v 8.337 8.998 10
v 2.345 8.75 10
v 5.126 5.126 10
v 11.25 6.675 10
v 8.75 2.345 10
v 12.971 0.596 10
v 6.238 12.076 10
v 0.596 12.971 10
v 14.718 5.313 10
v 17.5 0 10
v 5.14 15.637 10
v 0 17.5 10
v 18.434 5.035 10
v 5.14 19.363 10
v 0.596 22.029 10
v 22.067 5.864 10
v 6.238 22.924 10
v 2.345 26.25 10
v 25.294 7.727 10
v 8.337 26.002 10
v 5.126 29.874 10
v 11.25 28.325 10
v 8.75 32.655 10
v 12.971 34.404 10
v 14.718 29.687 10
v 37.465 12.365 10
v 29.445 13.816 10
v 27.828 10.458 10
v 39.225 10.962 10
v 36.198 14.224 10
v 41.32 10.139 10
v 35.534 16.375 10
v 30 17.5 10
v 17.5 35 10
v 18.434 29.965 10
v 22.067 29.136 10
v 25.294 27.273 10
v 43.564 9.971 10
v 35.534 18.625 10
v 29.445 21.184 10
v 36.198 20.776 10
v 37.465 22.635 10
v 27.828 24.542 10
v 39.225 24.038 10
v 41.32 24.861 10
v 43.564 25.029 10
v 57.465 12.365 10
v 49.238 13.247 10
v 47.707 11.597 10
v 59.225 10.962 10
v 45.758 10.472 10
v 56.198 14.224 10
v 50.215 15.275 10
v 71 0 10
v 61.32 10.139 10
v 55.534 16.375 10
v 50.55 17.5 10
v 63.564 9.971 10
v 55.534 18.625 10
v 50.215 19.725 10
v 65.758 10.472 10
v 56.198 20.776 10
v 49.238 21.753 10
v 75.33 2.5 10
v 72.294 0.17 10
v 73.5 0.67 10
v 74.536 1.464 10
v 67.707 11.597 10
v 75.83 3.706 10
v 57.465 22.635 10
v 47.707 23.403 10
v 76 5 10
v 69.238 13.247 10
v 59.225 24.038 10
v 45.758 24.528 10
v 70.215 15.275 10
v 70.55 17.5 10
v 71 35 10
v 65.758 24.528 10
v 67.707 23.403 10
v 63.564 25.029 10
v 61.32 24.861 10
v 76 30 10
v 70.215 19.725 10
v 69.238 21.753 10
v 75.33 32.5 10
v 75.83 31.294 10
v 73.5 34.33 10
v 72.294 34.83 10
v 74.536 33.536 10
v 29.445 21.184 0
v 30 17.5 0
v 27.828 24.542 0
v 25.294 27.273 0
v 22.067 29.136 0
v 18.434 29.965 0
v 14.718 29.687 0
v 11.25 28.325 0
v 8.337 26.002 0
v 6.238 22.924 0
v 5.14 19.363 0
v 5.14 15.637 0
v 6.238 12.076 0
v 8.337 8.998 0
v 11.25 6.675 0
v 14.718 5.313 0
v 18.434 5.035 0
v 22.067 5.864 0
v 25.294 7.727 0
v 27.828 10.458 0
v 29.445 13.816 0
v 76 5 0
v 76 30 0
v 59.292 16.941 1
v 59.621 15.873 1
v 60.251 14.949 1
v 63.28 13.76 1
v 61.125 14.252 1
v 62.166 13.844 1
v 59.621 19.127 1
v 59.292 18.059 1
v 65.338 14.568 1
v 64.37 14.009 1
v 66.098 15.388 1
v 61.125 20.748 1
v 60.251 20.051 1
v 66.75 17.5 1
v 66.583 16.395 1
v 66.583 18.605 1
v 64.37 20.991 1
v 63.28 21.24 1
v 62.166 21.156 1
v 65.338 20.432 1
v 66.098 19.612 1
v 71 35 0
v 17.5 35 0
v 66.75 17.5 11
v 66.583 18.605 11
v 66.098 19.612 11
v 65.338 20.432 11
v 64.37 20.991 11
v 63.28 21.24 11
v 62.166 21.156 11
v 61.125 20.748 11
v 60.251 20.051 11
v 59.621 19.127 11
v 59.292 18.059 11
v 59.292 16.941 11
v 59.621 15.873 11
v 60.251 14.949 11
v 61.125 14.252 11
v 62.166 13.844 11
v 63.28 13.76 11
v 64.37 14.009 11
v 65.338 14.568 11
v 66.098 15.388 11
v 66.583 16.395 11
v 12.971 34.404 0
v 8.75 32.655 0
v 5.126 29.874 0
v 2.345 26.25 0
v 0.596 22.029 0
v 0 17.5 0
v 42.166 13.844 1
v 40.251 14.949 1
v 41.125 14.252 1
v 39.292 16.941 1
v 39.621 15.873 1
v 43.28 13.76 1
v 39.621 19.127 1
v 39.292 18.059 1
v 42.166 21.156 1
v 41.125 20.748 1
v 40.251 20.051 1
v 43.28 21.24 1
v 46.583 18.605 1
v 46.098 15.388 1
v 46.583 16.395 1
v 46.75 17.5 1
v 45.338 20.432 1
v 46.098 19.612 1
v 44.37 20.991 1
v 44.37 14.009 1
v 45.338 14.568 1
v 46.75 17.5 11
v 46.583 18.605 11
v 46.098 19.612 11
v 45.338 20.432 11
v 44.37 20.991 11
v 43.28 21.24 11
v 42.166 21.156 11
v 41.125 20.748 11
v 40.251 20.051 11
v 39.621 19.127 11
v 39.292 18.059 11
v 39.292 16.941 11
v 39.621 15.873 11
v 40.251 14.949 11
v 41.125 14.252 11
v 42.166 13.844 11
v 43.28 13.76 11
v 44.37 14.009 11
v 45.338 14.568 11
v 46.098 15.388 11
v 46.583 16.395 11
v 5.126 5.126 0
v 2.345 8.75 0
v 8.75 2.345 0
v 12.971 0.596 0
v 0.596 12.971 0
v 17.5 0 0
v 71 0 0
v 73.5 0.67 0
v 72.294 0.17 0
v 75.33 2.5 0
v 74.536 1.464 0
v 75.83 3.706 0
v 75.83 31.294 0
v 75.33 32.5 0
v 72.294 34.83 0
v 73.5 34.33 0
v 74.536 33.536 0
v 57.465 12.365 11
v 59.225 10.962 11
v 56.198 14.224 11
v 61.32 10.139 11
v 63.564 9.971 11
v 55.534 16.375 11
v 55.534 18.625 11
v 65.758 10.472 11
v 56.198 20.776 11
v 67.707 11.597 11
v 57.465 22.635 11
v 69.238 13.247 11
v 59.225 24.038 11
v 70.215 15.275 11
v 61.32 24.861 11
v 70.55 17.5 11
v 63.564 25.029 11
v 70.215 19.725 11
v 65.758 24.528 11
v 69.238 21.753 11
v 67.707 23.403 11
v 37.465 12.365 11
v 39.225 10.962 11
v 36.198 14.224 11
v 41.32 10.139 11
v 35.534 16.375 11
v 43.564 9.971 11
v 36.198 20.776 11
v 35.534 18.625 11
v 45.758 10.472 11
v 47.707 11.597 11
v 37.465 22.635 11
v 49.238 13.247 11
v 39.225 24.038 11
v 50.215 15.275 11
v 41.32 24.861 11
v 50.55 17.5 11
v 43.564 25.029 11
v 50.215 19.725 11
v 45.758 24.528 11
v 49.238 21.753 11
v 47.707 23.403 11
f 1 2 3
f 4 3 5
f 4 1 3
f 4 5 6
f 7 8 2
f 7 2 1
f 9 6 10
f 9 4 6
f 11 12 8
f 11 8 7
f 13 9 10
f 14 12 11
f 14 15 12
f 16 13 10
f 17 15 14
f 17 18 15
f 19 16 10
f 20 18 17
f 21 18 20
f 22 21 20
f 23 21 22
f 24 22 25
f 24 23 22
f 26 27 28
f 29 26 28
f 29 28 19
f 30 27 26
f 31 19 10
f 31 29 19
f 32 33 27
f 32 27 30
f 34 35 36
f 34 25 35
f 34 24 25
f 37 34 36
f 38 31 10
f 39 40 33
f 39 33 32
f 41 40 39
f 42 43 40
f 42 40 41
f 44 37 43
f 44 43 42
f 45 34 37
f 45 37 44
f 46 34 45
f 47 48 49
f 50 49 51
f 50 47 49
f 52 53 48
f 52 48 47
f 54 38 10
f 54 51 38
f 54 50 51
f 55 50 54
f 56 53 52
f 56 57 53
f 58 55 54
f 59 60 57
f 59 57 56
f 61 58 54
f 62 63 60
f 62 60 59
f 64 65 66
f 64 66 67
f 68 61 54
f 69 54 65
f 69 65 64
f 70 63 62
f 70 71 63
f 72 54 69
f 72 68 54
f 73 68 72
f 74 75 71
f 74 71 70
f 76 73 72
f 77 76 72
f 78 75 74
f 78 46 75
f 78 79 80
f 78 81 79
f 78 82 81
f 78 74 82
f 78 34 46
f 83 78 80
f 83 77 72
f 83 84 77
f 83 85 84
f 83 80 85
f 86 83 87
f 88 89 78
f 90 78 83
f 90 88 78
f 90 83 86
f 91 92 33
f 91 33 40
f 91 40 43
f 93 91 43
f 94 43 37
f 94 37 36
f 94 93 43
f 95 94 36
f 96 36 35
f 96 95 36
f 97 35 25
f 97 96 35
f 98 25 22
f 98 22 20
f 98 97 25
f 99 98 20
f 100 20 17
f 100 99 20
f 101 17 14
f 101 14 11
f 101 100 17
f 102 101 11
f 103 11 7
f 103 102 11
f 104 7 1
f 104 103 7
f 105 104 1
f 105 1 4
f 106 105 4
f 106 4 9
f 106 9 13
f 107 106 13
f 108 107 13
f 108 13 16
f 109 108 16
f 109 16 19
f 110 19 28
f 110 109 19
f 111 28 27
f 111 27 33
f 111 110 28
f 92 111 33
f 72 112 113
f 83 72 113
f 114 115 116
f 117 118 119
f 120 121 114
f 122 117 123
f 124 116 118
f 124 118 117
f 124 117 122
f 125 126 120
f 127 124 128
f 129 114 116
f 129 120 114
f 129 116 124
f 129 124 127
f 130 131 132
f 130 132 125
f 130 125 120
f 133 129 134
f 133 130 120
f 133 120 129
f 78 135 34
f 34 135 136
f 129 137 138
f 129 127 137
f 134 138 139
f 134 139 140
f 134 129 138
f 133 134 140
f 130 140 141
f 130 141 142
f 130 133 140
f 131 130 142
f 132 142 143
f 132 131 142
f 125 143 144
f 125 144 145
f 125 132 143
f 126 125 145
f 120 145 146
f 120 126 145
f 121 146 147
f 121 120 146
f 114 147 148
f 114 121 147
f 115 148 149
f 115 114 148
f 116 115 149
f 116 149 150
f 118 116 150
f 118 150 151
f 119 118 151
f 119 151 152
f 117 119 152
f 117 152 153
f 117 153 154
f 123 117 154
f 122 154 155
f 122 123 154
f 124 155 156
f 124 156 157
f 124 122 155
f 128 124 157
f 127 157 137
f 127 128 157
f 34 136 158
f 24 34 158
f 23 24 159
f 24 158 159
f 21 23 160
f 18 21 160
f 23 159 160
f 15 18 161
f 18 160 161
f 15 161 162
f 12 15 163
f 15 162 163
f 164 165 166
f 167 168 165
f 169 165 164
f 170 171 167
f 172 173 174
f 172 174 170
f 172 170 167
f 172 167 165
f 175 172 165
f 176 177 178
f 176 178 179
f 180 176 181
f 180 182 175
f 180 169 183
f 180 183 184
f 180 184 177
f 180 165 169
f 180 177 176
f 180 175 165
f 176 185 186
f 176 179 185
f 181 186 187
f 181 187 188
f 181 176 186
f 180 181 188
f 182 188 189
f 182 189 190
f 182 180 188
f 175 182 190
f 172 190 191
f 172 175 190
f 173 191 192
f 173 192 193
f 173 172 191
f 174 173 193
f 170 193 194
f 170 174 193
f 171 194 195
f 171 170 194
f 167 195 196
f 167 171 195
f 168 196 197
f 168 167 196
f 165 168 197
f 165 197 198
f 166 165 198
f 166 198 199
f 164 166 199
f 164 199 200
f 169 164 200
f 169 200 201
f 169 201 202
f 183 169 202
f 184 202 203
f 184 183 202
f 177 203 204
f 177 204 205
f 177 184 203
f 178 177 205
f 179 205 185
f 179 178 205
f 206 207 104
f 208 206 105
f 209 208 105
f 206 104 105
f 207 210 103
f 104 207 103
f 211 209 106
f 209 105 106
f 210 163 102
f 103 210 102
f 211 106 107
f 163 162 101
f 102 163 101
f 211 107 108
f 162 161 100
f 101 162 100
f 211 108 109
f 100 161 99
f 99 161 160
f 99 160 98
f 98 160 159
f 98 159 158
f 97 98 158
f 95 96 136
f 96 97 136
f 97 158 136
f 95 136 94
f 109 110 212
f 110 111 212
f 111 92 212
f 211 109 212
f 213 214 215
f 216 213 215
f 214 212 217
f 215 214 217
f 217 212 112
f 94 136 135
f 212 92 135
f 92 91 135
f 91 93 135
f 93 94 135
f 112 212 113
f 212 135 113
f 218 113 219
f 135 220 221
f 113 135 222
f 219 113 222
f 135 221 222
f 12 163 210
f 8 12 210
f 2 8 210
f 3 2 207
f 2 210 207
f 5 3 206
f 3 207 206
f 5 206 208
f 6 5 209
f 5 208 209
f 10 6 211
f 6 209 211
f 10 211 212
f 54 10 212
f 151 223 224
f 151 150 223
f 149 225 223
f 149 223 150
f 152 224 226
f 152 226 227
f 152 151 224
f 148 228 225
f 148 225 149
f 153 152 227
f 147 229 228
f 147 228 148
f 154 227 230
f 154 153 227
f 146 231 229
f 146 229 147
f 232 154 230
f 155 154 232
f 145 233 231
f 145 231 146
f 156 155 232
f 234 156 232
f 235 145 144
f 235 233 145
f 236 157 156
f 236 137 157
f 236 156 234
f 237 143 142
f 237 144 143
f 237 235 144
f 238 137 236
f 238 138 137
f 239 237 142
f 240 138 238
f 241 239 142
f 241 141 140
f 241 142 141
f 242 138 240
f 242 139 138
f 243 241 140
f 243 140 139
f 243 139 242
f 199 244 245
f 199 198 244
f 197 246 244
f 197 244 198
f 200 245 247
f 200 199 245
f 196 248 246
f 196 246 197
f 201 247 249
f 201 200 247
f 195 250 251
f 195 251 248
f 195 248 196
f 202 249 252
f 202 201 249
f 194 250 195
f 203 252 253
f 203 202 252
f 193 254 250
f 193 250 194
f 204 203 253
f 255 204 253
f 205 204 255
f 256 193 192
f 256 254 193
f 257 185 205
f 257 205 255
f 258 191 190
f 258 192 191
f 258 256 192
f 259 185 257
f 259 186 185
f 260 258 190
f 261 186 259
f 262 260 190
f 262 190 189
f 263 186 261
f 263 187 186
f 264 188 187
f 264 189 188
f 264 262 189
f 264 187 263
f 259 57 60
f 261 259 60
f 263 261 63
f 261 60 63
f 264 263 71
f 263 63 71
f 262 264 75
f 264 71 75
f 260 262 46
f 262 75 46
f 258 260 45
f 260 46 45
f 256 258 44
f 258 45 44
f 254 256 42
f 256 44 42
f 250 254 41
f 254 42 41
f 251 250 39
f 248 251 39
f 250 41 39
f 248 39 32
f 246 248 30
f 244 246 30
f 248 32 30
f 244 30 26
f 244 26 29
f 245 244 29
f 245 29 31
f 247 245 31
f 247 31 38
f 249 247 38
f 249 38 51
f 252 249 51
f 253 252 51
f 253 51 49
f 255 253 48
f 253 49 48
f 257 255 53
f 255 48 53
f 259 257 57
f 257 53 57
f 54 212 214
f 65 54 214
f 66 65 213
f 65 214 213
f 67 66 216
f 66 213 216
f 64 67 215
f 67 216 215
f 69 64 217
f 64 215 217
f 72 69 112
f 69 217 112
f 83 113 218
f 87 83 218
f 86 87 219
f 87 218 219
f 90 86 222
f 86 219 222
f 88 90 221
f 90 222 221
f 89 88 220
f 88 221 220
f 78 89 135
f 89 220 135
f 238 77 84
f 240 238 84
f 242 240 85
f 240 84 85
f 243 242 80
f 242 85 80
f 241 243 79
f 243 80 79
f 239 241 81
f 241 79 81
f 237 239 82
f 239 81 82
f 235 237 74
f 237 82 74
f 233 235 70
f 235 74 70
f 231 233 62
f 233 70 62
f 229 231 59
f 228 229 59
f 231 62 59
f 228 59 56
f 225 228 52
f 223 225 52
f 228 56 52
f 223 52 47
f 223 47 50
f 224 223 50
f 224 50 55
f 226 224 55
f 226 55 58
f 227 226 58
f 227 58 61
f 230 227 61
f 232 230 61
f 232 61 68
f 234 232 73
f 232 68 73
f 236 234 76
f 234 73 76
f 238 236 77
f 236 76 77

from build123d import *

# Parameters (mm, degrees)
F0_R     = 12.5
F1_DEPTH = 10
F2_R     = 7.55
F2_R_2   = 3.75
F3_DEPTH = 1
F4_DEPTH = 9


with BuildPart() as f1:
    # F0 (on Top) → F1 (new body)
    with BuildSketch(Plane.XY):
        with BuildLine():
            ThreePointArc((0, 17.5), (5.1256313292, 5.1256313292), (17.5, 0))
            Line((17.5, 0), (71, 0))
            ThreePointArc((71, 0), (74.5355339059, 1.4644660941), (76, 5))
            Line((76, 5), (76, 30))
            ThreePointArc((76, 30), (74.5355339059, 33.5355339059), (71, 35))
            Line((71, 35), (17.5, 35))
            ThreePointArc((17.5, 35), (5.1256313292, 29.8743686708), (0, 17.5))
        make_face()
        with Locations((17.5, 17.5)):
            Circle(F0_R, mode=Mode.SUBTRACT)
    extrude(amount=F1_DEPTH)

    # F2 (on face) → F3 (join)
    with BuildSketch(Plane.XY.offset(10)):
        with Locations((43, 17.5)):
            Circle(F2_R)
        with Locations((43, 17.5)):
            Circle(F2_R_2, mode=Mode.SUBTRACT)
        with Locations((63, 17.5)):
            Circle(F2_R)
        with Locations((63, 17.5)):
            Circle(F2_R_2, mode=Mode.SUBTRACT)
    extrude(amount=F3_DEPTH)

    # F4 (cut): faces of the model
    f4_faces = [f1.faces().sort_by_distance(p)[0] for p in [
        (43, 17.5, 10),
        (63, 17.5, 10),
    ]]
    extrude(f4_faces, amount=-F4_DEPTH, mode=Mode.SUBTRACT)


solid = f1.part
